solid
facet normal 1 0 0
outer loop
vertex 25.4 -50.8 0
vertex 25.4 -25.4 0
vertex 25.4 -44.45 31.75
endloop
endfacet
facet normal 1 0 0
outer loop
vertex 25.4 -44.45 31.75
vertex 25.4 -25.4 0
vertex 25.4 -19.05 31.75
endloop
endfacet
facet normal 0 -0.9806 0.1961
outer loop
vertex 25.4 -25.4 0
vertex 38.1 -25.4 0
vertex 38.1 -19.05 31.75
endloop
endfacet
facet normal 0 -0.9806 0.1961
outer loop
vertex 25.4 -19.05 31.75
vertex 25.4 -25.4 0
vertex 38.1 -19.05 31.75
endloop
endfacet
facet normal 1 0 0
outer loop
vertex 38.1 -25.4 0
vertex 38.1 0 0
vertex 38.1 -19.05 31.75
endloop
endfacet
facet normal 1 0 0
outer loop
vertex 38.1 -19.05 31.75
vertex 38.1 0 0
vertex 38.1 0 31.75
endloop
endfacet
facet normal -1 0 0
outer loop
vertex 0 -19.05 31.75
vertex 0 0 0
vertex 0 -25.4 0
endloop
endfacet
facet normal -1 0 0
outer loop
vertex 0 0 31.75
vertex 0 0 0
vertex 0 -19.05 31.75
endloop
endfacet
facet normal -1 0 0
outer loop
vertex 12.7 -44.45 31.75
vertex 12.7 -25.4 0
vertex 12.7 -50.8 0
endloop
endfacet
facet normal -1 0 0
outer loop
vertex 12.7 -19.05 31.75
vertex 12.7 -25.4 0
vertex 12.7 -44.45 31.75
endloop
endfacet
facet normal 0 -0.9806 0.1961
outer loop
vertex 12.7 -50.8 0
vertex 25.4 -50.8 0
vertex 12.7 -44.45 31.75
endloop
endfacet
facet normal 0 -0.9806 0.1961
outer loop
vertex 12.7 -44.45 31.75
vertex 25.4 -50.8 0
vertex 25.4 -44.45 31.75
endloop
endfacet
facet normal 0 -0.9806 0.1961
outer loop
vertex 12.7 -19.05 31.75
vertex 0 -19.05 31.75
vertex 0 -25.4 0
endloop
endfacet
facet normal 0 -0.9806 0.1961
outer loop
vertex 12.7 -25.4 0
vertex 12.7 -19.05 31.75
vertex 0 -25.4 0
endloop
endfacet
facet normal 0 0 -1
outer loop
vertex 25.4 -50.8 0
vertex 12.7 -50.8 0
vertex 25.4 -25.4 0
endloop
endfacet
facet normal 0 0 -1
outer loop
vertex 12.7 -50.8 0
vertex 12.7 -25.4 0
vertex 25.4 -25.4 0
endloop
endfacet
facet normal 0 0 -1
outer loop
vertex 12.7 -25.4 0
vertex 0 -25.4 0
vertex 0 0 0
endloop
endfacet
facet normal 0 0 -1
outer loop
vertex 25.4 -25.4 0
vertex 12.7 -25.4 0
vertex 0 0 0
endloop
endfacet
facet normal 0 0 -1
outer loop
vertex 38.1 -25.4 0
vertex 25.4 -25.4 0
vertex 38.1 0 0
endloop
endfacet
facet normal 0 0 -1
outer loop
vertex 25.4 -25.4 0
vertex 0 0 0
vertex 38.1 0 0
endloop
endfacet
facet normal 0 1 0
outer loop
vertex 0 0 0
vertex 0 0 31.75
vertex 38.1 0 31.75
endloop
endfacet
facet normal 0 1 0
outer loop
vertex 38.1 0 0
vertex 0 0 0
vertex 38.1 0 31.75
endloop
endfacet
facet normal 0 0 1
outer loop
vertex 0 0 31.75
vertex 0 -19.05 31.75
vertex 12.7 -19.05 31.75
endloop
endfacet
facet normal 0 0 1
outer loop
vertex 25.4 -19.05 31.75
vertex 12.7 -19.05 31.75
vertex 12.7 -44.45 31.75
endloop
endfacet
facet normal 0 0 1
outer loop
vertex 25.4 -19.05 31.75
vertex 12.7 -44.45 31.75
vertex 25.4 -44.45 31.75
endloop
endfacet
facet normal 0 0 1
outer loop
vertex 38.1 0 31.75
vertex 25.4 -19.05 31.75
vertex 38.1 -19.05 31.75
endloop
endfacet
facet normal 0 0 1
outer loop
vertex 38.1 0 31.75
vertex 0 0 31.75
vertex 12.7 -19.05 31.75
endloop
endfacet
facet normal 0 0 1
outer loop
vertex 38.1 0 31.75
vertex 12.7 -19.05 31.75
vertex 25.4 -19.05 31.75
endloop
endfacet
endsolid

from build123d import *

# Parameters (mm, degrees)
F0_W      = 38.1
F0_H      = 31.75
F1_DEPTH  = 44.45
F2_W      = 12.7
F2_H      = 31.75
F3_DEPTH  = 19.05
F5_DEPTH  = 12.7
F7_DEPTH  = 12.7
F8_DEPTH  = 6.35
F10_DEPTH = 25.4


# Not quite as in the source:
# - a feature names something its author has since deleted; it is built from what else it names


with BuildPart() as f1:
    # F0 (on Front) → F1 (new body)
    with BuildSketch(Plane.XZ):
        with Locations((19.05, 15.875)):
            Rectangle(F0_W, F0_H)
    extrude(amount=F1_DEPTH)

    # F2 (on face) → F3 (cut)
    with BuildSketch(Plane.XZ.offset(44.45)):
        with Locations((31.75, 15.875)):
            Rectangle(F2_W, F2_H)
        with Locations((6.35, 15.875)):
            Rectangle(F2_W, F2_H)
    extrude(amount=-F3_DEPTH, mode=Mode.SUBTRACT)

    # F4 (on face) → F5 (cut)
    with BuildSketch(Plane.YZ.offset(38.1)):
        Polygon((-25.4, 0), (-19.05, 31.75), (-25.4, 31.75), align=None)
    extrude(amount=-F5_DEPTH, mode=Mode.SUBTRACT)

    # F6 (on face) → F7 (cut)
    with BuildSketch(Plane(origin=(0, 0, 0), x_dir=(0, -1, 0), z_dir=(-1, 0, 0))):
        Polygon((25.4, 0), (25.4, 31.75), (19.05, 31.75), align=None)
    extrude(amount=-F7_DEPTH, mode=Mode.SUBTRACT)

    # F8 (add): a face of the model
    f8_faces = [f1.faces().sort_by_distance(p)[0] for p in [
        (19.05, -44.45, 15.875),
    ]]
    extrude(f8_faces, amount=F8_DEPTH)

    # F9 (on face) → F10 (cut)
    with BuildSketch(Plane.YZ.offset(25.4)):
        Polygon((-50.8, 0), (-44.45, 31.75), (-50.8, 31.75), align=None)
    extrude(amount=-F10_DEPTH, mode=Mode.SUBTRACT)


solid = f1.part
